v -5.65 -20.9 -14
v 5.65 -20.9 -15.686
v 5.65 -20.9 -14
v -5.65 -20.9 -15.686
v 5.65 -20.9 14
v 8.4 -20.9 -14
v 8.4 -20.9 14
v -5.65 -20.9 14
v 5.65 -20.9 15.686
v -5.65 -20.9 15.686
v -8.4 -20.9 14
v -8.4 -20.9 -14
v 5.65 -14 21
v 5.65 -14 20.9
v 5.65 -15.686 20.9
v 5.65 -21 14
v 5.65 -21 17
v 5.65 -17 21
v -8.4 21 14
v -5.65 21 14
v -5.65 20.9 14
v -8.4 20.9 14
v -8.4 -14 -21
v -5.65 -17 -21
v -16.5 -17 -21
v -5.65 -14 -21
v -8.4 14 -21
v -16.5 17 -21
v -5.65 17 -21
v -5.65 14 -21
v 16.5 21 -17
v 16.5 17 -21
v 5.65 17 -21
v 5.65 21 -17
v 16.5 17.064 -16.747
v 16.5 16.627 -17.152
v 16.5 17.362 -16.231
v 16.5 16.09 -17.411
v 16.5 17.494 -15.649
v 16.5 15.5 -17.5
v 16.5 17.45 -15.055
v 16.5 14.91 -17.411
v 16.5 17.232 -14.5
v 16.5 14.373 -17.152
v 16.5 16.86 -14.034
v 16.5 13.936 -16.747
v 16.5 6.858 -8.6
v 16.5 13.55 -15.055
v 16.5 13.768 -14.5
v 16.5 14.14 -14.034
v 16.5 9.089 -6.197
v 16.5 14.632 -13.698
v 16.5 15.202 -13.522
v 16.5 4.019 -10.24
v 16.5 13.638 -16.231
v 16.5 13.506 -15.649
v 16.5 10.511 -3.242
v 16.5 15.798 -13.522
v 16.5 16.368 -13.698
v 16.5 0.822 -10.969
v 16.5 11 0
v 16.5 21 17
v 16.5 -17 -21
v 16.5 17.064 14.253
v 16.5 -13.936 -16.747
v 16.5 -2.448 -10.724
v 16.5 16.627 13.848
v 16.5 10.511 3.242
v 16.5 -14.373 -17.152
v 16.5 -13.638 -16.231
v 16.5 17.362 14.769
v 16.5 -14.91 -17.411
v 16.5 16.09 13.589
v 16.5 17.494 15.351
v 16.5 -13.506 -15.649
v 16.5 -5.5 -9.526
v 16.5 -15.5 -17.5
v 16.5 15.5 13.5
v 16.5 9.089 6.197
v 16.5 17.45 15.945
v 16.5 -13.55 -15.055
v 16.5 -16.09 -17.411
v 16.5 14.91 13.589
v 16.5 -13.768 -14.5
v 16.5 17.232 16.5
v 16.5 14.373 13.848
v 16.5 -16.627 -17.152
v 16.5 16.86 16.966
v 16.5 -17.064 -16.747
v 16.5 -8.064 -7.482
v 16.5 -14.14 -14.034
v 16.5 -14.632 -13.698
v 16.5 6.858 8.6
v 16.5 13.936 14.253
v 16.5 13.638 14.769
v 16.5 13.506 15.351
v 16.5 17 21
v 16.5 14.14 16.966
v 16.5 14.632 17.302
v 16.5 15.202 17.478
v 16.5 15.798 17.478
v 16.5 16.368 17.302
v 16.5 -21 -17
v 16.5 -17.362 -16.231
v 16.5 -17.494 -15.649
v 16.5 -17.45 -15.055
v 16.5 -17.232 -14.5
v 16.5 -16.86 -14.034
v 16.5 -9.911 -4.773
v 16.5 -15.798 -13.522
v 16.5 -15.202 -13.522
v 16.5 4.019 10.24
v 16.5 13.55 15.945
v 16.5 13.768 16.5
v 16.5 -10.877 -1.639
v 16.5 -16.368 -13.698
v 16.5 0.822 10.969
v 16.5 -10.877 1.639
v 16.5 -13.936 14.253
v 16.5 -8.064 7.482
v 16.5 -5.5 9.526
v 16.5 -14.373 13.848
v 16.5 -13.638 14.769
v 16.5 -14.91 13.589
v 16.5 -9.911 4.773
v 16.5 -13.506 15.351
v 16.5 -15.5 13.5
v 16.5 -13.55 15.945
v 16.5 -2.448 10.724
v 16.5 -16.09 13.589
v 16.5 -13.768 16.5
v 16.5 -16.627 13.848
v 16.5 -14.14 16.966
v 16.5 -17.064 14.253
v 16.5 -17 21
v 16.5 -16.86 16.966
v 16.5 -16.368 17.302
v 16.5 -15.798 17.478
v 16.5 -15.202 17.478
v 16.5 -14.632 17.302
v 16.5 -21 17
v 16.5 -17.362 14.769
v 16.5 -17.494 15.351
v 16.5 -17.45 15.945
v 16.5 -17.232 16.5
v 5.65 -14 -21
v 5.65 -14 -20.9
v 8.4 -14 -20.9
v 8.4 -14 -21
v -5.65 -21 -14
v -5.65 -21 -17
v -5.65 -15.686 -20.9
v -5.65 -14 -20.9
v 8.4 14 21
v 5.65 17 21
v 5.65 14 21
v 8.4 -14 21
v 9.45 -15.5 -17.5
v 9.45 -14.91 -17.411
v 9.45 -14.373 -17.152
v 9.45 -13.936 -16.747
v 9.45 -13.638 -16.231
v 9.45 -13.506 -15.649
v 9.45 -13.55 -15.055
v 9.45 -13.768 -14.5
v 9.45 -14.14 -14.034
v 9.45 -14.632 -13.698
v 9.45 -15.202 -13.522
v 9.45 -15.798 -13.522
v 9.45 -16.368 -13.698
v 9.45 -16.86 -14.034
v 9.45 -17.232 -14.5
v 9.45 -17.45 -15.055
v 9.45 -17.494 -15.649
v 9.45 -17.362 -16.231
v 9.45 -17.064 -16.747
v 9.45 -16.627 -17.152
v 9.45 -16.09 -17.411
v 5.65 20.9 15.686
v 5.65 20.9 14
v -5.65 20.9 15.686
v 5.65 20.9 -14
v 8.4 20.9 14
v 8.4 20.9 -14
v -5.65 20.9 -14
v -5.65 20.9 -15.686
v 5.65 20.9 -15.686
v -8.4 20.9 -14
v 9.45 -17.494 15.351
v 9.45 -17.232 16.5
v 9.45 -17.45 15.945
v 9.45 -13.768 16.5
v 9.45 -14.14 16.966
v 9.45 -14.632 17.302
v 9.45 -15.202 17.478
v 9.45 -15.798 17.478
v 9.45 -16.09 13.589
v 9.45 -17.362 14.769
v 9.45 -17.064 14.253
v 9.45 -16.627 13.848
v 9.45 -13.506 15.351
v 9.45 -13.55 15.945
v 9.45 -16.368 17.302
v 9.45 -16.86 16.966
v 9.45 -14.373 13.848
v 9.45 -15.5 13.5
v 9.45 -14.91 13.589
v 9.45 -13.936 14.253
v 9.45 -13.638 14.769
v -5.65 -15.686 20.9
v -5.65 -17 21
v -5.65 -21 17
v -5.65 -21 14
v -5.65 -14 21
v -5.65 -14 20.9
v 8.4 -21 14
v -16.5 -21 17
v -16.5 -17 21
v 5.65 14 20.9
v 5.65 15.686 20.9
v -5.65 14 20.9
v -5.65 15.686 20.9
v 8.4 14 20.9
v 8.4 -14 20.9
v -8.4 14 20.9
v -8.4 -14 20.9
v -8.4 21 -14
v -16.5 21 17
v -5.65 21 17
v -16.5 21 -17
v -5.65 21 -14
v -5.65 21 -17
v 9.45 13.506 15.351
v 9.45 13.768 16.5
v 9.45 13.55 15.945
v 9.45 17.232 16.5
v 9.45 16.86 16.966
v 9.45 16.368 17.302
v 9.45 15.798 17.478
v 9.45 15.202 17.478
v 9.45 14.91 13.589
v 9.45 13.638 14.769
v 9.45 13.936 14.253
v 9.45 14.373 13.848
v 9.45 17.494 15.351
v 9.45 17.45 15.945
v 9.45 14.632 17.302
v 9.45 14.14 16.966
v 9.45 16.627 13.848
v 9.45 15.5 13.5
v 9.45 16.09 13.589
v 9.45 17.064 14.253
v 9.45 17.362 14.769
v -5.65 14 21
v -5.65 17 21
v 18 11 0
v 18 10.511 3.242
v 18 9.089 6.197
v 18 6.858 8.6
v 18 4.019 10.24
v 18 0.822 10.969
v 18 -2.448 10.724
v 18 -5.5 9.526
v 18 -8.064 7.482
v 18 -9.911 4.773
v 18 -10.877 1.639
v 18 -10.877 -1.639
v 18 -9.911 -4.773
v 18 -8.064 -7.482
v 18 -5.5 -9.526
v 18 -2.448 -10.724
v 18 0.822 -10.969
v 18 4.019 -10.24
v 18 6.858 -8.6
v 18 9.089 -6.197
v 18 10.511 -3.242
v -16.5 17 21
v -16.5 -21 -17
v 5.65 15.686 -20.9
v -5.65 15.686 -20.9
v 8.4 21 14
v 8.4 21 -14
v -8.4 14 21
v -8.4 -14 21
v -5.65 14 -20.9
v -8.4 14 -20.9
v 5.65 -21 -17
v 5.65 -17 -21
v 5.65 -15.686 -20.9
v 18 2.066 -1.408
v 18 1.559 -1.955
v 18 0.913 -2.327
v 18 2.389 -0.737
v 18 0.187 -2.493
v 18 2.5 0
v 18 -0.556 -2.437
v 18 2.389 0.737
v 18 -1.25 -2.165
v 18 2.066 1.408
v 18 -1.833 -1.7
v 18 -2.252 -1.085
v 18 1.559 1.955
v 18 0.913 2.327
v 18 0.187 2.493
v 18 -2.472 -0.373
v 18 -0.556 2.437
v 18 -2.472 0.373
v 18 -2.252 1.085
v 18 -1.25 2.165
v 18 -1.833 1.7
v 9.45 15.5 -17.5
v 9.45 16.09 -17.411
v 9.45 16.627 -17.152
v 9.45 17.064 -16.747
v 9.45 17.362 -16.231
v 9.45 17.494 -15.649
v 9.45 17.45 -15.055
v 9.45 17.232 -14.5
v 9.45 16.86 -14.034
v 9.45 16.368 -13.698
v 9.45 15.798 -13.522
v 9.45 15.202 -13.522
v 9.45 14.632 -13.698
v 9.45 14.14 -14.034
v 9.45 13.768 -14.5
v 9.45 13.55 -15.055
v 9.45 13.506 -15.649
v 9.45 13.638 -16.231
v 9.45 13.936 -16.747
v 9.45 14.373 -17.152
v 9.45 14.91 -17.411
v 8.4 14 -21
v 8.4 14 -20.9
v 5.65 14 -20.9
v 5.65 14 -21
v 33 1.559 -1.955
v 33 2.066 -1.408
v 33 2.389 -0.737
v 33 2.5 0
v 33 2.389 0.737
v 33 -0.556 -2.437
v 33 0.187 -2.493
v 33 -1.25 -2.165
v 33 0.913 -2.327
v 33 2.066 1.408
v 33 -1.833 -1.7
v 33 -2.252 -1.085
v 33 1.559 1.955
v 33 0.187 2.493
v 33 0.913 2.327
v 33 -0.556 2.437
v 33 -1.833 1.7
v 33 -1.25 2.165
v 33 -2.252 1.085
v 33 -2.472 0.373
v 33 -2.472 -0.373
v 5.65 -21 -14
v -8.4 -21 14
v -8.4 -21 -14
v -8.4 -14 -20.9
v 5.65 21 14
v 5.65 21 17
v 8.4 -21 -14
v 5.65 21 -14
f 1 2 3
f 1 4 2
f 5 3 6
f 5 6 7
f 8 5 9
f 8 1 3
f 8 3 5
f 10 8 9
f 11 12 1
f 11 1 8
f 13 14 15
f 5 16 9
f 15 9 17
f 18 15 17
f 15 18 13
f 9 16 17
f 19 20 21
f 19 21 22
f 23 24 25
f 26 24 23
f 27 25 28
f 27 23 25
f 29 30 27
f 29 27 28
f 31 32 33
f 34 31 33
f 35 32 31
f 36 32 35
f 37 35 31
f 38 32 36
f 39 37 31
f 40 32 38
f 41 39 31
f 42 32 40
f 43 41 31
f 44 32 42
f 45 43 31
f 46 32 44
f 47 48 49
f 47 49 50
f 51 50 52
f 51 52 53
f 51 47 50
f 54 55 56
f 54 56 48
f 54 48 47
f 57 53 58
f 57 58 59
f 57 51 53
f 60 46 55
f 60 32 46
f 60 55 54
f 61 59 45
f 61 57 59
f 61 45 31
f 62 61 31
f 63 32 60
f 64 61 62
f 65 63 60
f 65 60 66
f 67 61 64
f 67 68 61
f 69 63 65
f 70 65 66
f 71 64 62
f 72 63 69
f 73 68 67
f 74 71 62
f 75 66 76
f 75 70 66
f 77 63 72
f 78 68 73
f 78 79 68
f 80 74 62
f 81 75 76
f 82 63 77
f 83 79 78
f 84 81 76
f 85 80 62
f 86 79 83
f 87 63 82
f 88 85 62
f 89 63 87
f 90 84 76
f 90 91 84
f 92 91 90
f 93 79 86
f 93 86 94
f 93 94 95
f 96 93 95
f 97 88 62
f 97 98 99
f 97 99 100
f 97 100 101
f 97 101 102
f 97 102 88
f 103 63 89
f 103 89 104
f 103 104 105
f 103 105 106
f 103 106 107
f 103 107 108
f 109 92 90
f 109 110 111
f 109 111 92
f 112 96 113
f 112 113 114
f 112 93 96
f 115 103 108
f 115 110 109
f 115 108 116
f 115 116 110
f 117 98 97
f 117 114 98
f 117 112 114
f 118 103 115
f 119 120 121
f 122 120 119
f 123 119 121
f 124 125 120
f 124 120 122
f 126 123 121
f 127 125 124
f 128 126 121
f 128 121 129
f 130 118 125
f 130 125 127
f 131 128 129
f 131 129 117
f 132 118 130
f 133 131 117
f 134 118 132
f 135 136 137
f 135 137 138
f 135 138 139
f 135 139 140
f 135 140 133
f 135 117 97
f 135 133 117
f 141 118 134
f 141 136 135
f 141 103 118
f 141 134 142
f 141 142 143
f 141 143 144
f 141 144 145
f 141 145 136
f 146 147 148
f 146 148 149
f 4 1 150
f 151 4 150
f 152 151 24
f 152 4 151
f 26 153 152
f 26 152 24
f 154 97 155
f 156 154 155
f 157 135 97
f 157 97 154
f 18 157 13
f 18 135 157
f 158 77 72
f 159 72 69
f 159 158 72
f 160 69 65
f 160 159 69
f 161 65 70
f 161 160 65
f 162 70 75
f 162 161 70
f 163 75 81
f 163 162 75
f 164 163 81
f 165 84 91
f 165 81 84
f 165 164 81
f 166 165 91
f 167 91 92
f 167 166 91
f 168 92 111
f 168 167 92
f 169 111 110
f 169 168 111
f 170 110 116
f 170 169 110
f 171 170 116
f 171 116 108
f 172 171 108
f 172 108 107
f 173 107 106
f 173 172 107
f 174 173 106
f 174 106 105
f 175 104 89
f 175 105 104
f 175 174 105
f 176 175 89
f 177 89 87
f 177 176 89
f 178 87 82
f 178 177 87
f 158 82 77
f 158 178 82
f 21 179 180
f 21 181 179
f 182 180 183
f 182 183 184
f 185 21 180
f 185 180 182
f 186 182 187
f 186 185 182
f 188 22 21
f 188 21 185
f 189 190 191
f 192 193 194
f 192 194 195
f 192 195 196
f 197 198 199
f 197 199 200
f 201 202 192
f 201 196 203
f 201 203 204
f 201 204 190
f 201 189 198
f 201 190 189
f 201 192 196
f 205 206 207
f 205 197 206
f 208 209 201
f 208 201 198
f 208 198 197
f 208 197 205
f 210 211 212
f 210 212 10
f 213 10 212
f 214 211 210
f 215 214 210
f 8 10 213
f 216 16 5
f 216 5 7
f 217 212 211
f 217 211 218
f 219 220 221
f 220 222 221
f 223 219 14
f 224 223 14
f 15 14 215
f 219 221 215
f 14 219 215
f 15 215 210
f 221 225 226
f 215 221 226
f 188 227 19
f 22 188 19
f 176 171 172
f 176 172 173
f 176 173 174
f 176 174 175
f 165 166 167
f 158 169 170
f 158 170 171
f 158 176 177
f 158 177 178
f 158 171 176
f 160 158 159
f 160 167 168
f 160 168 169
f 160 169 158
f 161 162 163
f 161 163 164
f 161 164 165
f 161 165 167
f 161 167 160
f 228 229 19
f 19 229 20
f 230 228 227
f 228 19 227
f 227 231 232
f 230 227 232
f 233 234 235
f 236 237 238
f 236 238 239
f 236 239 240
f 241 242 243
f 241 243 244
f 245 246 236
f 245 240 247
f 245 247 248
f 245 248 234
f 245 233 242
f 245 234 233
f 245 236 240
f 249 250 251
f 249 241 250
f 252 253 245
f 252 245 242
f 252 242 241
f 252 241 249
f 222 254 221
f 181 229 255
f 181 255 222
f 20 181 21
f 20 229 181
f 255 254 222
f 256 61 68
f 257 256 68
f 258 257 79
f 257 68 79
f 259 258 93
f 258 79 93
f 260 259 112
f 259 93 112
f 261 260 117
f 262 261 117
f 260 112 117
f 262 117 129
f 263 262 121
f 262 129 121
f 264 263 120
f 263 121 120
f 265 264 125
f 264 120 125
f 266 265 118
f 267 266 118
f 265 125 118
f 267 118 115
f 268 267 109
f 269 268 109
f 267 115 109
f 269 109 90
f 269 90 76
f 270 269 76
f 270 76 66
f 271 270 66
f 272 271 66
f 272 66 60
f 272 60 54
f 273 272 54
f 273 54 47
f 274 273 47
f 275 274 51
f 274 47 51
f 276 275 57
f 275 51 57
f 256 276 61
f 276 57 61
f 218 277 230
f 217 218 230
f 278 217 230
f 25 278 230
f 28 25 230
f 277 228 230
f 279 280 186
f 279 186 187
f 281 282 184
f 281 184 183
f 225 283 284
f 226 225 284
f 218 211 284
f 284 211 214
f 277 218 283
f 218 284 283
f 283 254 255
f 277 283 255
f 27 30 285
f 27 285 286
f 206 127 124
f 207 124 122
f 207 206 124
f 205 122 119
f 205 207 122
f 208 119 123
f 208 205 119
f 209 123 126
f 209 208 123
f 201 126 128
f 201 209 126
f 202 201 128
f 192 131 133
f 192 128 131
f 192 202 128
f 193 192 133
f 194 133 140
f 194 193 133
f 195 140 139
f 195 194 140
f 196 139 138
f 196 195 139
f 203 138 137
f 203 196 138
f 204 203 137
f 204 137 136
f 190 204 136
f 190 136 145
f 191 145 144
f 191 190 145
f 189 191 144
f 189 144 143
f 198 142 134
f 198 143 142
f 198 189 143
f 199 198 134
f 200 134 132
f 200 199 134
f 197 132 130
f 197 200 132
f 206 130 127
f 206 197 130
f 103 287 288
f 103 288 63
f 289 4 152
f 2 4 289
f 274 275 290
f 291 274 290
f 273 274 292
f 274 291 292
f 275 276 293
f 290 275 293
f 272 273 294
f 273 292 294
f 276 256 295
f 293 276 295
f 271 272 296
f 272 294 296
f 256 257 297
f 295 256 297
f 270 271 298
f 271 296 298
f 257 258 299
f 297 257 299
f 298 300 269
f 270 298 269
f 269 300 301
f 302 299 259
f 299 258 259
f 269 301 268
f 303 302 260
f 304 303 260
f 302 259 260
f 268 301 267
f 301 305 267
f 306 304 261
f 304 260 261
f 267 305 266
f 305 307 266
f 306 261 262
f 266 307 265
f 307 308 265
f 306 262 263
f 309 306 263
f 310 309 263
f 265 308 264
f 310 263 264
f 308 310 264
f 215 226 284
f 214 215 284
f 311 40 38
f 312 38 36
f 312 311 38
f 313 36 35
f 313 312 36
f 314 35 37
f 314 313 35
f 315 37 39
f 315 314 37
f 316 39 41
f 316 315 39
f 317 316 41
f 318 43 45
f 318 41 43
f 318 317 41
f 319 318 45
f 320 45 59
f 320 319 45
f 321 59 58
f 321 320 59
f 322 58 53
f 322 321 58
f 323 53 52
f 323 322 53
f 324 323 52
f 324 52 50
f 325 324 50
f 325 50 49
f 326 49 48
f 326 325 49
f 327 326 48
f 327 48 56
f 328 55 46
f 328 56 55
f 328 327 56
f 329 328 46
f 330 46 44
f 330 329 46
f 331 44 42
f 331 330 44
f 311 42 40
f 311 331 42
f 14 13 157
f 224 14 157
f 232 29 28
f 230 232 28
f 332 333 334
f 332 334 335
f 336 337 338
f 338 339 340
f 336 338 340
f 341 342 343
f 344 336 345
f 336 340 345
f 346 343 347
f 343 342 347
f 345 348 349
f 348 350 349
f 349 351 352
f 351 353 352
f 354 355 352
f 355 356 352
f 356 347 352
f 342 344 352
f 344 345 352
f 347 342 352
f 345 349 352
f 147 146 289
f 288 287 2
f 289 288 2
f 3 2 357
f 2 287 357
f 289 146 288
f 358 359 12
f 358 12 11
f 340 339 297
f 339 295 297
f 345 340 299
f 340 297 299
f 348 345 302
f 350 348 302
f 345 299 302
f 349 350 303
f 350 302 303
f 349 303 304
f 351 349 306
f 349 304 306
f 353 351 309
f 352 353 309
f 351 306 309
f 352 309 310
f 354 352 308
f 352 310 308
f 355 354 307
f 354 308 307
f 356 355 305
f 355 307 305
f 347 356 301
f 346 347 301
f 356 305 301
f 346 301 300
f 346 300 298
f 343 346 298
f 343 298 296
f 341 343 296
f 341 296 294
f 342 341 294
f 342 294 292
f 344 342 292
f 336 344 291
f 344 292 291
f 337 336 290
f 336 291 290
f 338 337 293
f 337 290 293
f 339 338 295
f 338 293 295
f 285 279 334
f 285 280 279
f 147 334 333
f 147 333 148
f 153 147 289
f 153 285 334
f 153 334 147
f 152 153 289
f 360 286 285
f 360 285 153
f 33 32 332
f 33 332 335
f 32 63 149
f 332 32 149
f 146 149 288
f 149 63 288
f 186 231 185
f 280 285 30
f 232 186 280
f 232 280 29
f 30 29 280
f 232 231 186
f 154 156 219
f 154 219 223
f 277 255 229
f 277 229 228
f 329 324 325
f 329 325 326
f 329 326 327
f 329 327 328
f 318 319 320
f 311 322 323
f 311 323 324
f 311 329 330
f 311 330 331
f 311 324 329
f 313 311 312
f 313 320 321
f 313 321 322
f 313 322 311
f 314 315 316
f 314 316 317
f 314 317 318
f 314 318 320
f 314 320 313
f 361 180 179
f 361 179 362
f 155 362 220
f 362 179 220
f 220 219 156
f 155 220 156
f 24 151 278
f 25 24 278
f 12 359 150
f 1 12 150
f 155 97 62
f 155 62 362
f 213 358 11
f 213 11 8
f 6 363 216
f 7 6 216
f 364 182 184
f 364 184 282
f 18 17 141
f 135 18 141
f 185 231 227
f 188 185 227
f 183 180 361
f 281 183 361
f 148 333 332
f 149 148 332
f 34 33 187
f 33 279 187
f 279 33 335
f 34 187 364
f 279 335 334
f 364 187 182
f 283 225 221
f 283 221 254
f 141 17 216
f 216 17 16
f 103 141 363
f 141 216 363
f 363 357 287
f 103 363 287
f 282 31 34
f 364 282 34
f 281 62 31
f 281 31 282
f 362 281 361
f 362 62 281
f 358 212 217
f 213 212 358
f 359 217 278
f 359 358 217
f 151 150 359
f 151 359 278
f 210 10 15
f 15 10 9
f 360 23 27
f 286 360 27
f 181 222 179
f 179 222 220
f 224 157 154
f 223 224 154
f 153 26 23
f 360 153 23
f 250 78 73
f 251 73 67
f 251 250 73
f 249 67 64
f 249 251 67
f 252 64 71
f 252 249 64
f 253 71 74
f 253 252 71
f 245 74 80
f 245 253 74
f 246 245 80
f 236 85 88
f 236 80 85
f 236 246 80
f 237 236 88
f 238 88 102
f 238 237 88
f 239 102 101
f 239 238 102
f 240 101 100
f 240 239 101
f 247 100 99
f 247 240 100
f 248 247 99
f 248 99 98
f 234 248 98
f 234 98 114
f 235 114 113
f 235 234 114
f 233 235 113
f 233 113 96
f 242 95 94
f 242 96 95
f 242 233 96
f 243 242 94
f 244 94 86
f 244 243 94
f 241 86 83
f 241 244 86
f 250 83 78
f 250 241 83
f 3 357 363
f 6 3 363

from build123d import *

# Parameters (mm, degrees)
CROQUIS1_W                  = 41.8
CROQUIS1_H                  = 41.8
SALIENTE_EXTRUIR1_DEPTH     = 11.3
CROQUIS2_W                  = 42
CROQUIS2_H                  = 41.9
SALIENTE_EXTRUIR2_DEPTH     = 10.85
CROQUIS3_W                  = 10.85
CROQUIS3_H                  = 42
SALIENTE_EXTRUIR3_DEPTH     = 0.1
CROQUIS4_W                  = 42
CROQUIS4_H                  = 42
SALIENTE_EXTRUIR4_DEPTH     = 10.85
CORTAR_EXTRUIR1_REACH       = 26.9
CROQUIS5_W                  = 0.1
CROQUIS5_H                  = 28
CORTAR_EXTRUIR2_REACH       = 26.9
CROQUIS6_W                  = 28
CROQUIS6_H                  = 0.1
CROQUIS7_W                  = 2.75
CROQUIS7_H                  = 28
CORTAR_EXTRUIR3_DEPTH       = 0.1
CROQUIS8_W                  = 2.75
CROQUIS8_H                  = 28
CORTAR_EXTRUIR4_DEPTH       = 0.1
CROQUIS9_W                  = 28
CROQUIS9_H                  = 0.1
CORTAR_EXTRUIR5_DEPTH       = 2.75
CROQUIS10_W                 = 2.75
CROQUIS10_H                 = 28
CORTAR_EXTRUIR6_DEPTH       = 0.1
CROQUIS11_W                 = 2.75
CROQUIS11_H                 = 28
CORTAR_EXTRUIR7_DEPTH       = 0.1
CROQUIS12_W                 = 2.75
CROQUIS12_H                 = 28
CORTAR_EXTRUIR8_DEPTH       = 0.1
CHAFL_N1_SIZE               = 5.214213562
CHAFL_N2_SIZE               = 4
CROQUIS18_R                 = 2
CORTAR_EXTRUIR10_DEPTH      = 6
CORTAR_EXTRUIR10_DEPTH_BACK = 3


with BuildPart() as part:
    # Croquis1 → Saliente-Extruir1 (new body)
    with BuildSketch(Plane(origin=(-5.65, 0, 0), x_dir=(0, -1, 0), z_dir=(-1, 0, 0))):
        Rectangle(CROQUIS1_W, CROQUIS1_H)
    extrude(amount=-SALIENTE_EXTRUIR1_DEPTH)

    # Croquis2 → Saliente-Extruir2 (add)
    with BuildSketch(Plane(origin=(5.65, 0, 0), x_dir=(0, 0, -1), z_dir=(1, 0, 0))):
        with Locations((0, -0.05)):
            Rectangle(CROQUIS2_W, CROQUIS2_H)
    extrude(amount=SALIENTE_EXTRUIR2_DEPTH)

    # Croquis3 → Saliente-Extruir3 (add)
    with BuildSketch(Plane(origin=(0, 20.9, 0), x_dir=(-1, 0, 0), z_dir=(0, 1, 0))):
        with Locations((-11.075, 0)):
            Rectangle(CROQUIS3_W, CROQUIS3_H)
    extrude(amount=SALIENTE_EXTRUIR3_DEPTH)

    # Croquis4 → Saliente-Extruir4 (add)
    with BuildSketch(Plane(origin=(-5.65, 0, 0), x_dir=(0, 0, -1), z_dir=(1, 0, 0))):
        Rectangle(CROQUIS4_W, CROQUIS4_H)
    extrude(amount=-SALIENTE_EXTRUIR4_DEPTH)

    # Croquis5 → Cortar-Extruir1 (cut, up to next)
    with BuildSketch(Plane(origin=(8.4, 0, 0), x_dir=(0, 0, -1), z_dir=(1, 0, 0)), mode=Mode.PRIVATE) as cortar_extruir1_sk1:
        with Locations((20.95, 0)):
            Rectangle(CROQUIS5_W, CROQUIS5_H)
    cortar_extruir1_tool1 = extrude(cortar_extruir1_sk1.sketch, amount=-CORTAR_EXTRUIR1_REACH, mode=Mode.PRIVATE) & part.part
    add(cortar_extruir1_tool1.solids().sort_by_distance((8.4, 0, -20.95))[0], mode=Mode.SUBTRACT)

    # Croquis6 → Cortar-Extruir2 (cut, up to next)
    with BuildSketch(Plane(origin=(-8.4, 0, 0), x_dir=(0, -1, 0), z_dir=(-1, 0, 0)), mode=Mode.PRIVATE) as cortar_extruir2_sk1:
        with Locations((0, 20.95)):
            Rectangle(CROQUIS6_W, CROQUIS6_H)
    cortar_extruir2_tool1 = extrude(cortar_extruir2_sk1.sketch, amount=-CORTAR_EXTRUIR2_REACH, mode=Mode.PRIVATE) & part.part
    add(cortar_extruir2_tool1.solids().sort_by_distance((-8.4, 0, 20.95))[0], mode=Mode.SUBTRACT)

    # Croquis7 → Cortar-Extruir3 (cut)
    with BuildSketch(Plane.XZ.offset(21)):
        with Locations((7.025, 0)):
            Rectangle(CROQUIS7_W, CROQUIS7_H)
    extrude(amount=-CORTAR_EXTRUIR3_DEPTH, mode=Mode.SUBTRACT)

    # Croquis8 → Cortar-Extruir4 (cut)
    with BuildSketch(Plane.XY.offset(21)):
        with Locations((7.025, 0)):
            Rectangle(CROQUIS8_W, CROQUIS8_H)
    extrude(amount=-CORTAR_EXTRUIR4_DEPTH, mode=Mode.SUBTRACT)

    # Croquis9 → Cortar-Extruir5 (cut)
    with BuildSketch(Plane.ZY.offset(-5.65)):
        with Locations((0, 20.95)):
            Rectangle(CROQUIS9_W, CROQUIS9_H)
    extrude(amount=-CORTAR_EXTRUIR5_DEPTH, mode=Mode.SUBTRACT)

    # Croquis10 → Cortar-Extruir6 (cut)
    with BuildSketch(Plane.XZ.offset(21)):
        with Locations((-7.025, 0)):
            Rectangle(CROQUIS10_W, CROQUIS10_H)
    extrude(amount=-CORTAR_EXTRUIR6_DEPTH, mode=Mode.SUBTRACT)

    # Croquis11 → Cortar-Extruir7 (cut)
    with BuildSketch(Plane(origin=(0, 0, -21), x_dir=(-1, 0, 0), z_dir=(0, 0, -1))):
        with Locations((7.025, 0)):
            Rectangle(CROQUIS11_W, CROQUIS11_H)
    extrude(amount=-CORTAR_EXTRUIR7_DEPTH, mode=Mode.SUBTRACT)

    # Croquis12 → Cortar-Extruir8 (cut)
    with BuildSketch(Plane(origin=(0, 21, 0), x_dir=(-1, 0, 0), z_dir=(0, 1, 0))):
        with Locations((7.025, 0)):
            Rectangle(CROQUIS12_W, CROQUIS12_H)
    extrude(amount=-CORTAR_EXTRUIR8_DEPTH, mode=Mode.SUBTRACT)

    # Croquis15 → Revolución1 (revolve)
    with BuildSketch(Plane.XY):
        Polygon((15.5, 11), (15.5, 0), (33, 0), (33, 2.5), (18, 2.5), (18, 11), align=None)
    revolve(axis=Axis((15.5, 0, 0), (1, 0, 0)))

    # Chaflán1
    chafl_n1_edges = [part.edges().sort_by_distance(p)[0] for p in [
        (0, -20.9, -20.9),
        (0, 20.9, 20.9),
        (0, 20.9, -20.9),
        (0, -20.9, 20.9),
    ]]
    chamfer(chafl_n1_edges, length=CHAFL_N1_SIZE)

    # Chaflán2
    chafl_n2_edges = [part.edges().sort_by_distance(p)[0] for p in [
        (11.075, -21, 21),
        (11.075, -21, -21),
        (11.075, 21, 21),
        (11.075, 21, -21),
        (-11.075, 21, -21),
        (-11.075, -21, -21),
        (-11.075, -21, 21),
        (-11.075, 21, 21),
    ]]
    chamfer(chafl_n2_edges, length=CHAFL_N2_SIZE)

    # Croquis18 → Cortar-Extruir10 (cut, two sides)
    with BuildSketch(Plane(origin=(12.45, 0, 0), x_dir=(0, 0, -1), z_dir=(1, 0, 0))) as cortar_extruir10_sk:
        with Locations((-15.5, 15.5)):
            Circle(CROQUIS18_R)
        with Locations((15.5, 15.5)):
            Circle(CROQUIS18_R)
        with Locations((15.5, -15.5)):
            Circle(CROQUIS18_R)
        with Locations((-15.5, -15.5)):
            Circle(CROQUIS18_R)
    extrude(amount=CORTAR_EXTRUIR10_DEPTH, mode=Mode.SUBTRACT)
    extrude(cortar_extruir10_sk.sketch, amount=-CORTAR_EXTRUIR10_DEPTH_BACK, mode=Mode.SUBTRACT)


solid = part.part
